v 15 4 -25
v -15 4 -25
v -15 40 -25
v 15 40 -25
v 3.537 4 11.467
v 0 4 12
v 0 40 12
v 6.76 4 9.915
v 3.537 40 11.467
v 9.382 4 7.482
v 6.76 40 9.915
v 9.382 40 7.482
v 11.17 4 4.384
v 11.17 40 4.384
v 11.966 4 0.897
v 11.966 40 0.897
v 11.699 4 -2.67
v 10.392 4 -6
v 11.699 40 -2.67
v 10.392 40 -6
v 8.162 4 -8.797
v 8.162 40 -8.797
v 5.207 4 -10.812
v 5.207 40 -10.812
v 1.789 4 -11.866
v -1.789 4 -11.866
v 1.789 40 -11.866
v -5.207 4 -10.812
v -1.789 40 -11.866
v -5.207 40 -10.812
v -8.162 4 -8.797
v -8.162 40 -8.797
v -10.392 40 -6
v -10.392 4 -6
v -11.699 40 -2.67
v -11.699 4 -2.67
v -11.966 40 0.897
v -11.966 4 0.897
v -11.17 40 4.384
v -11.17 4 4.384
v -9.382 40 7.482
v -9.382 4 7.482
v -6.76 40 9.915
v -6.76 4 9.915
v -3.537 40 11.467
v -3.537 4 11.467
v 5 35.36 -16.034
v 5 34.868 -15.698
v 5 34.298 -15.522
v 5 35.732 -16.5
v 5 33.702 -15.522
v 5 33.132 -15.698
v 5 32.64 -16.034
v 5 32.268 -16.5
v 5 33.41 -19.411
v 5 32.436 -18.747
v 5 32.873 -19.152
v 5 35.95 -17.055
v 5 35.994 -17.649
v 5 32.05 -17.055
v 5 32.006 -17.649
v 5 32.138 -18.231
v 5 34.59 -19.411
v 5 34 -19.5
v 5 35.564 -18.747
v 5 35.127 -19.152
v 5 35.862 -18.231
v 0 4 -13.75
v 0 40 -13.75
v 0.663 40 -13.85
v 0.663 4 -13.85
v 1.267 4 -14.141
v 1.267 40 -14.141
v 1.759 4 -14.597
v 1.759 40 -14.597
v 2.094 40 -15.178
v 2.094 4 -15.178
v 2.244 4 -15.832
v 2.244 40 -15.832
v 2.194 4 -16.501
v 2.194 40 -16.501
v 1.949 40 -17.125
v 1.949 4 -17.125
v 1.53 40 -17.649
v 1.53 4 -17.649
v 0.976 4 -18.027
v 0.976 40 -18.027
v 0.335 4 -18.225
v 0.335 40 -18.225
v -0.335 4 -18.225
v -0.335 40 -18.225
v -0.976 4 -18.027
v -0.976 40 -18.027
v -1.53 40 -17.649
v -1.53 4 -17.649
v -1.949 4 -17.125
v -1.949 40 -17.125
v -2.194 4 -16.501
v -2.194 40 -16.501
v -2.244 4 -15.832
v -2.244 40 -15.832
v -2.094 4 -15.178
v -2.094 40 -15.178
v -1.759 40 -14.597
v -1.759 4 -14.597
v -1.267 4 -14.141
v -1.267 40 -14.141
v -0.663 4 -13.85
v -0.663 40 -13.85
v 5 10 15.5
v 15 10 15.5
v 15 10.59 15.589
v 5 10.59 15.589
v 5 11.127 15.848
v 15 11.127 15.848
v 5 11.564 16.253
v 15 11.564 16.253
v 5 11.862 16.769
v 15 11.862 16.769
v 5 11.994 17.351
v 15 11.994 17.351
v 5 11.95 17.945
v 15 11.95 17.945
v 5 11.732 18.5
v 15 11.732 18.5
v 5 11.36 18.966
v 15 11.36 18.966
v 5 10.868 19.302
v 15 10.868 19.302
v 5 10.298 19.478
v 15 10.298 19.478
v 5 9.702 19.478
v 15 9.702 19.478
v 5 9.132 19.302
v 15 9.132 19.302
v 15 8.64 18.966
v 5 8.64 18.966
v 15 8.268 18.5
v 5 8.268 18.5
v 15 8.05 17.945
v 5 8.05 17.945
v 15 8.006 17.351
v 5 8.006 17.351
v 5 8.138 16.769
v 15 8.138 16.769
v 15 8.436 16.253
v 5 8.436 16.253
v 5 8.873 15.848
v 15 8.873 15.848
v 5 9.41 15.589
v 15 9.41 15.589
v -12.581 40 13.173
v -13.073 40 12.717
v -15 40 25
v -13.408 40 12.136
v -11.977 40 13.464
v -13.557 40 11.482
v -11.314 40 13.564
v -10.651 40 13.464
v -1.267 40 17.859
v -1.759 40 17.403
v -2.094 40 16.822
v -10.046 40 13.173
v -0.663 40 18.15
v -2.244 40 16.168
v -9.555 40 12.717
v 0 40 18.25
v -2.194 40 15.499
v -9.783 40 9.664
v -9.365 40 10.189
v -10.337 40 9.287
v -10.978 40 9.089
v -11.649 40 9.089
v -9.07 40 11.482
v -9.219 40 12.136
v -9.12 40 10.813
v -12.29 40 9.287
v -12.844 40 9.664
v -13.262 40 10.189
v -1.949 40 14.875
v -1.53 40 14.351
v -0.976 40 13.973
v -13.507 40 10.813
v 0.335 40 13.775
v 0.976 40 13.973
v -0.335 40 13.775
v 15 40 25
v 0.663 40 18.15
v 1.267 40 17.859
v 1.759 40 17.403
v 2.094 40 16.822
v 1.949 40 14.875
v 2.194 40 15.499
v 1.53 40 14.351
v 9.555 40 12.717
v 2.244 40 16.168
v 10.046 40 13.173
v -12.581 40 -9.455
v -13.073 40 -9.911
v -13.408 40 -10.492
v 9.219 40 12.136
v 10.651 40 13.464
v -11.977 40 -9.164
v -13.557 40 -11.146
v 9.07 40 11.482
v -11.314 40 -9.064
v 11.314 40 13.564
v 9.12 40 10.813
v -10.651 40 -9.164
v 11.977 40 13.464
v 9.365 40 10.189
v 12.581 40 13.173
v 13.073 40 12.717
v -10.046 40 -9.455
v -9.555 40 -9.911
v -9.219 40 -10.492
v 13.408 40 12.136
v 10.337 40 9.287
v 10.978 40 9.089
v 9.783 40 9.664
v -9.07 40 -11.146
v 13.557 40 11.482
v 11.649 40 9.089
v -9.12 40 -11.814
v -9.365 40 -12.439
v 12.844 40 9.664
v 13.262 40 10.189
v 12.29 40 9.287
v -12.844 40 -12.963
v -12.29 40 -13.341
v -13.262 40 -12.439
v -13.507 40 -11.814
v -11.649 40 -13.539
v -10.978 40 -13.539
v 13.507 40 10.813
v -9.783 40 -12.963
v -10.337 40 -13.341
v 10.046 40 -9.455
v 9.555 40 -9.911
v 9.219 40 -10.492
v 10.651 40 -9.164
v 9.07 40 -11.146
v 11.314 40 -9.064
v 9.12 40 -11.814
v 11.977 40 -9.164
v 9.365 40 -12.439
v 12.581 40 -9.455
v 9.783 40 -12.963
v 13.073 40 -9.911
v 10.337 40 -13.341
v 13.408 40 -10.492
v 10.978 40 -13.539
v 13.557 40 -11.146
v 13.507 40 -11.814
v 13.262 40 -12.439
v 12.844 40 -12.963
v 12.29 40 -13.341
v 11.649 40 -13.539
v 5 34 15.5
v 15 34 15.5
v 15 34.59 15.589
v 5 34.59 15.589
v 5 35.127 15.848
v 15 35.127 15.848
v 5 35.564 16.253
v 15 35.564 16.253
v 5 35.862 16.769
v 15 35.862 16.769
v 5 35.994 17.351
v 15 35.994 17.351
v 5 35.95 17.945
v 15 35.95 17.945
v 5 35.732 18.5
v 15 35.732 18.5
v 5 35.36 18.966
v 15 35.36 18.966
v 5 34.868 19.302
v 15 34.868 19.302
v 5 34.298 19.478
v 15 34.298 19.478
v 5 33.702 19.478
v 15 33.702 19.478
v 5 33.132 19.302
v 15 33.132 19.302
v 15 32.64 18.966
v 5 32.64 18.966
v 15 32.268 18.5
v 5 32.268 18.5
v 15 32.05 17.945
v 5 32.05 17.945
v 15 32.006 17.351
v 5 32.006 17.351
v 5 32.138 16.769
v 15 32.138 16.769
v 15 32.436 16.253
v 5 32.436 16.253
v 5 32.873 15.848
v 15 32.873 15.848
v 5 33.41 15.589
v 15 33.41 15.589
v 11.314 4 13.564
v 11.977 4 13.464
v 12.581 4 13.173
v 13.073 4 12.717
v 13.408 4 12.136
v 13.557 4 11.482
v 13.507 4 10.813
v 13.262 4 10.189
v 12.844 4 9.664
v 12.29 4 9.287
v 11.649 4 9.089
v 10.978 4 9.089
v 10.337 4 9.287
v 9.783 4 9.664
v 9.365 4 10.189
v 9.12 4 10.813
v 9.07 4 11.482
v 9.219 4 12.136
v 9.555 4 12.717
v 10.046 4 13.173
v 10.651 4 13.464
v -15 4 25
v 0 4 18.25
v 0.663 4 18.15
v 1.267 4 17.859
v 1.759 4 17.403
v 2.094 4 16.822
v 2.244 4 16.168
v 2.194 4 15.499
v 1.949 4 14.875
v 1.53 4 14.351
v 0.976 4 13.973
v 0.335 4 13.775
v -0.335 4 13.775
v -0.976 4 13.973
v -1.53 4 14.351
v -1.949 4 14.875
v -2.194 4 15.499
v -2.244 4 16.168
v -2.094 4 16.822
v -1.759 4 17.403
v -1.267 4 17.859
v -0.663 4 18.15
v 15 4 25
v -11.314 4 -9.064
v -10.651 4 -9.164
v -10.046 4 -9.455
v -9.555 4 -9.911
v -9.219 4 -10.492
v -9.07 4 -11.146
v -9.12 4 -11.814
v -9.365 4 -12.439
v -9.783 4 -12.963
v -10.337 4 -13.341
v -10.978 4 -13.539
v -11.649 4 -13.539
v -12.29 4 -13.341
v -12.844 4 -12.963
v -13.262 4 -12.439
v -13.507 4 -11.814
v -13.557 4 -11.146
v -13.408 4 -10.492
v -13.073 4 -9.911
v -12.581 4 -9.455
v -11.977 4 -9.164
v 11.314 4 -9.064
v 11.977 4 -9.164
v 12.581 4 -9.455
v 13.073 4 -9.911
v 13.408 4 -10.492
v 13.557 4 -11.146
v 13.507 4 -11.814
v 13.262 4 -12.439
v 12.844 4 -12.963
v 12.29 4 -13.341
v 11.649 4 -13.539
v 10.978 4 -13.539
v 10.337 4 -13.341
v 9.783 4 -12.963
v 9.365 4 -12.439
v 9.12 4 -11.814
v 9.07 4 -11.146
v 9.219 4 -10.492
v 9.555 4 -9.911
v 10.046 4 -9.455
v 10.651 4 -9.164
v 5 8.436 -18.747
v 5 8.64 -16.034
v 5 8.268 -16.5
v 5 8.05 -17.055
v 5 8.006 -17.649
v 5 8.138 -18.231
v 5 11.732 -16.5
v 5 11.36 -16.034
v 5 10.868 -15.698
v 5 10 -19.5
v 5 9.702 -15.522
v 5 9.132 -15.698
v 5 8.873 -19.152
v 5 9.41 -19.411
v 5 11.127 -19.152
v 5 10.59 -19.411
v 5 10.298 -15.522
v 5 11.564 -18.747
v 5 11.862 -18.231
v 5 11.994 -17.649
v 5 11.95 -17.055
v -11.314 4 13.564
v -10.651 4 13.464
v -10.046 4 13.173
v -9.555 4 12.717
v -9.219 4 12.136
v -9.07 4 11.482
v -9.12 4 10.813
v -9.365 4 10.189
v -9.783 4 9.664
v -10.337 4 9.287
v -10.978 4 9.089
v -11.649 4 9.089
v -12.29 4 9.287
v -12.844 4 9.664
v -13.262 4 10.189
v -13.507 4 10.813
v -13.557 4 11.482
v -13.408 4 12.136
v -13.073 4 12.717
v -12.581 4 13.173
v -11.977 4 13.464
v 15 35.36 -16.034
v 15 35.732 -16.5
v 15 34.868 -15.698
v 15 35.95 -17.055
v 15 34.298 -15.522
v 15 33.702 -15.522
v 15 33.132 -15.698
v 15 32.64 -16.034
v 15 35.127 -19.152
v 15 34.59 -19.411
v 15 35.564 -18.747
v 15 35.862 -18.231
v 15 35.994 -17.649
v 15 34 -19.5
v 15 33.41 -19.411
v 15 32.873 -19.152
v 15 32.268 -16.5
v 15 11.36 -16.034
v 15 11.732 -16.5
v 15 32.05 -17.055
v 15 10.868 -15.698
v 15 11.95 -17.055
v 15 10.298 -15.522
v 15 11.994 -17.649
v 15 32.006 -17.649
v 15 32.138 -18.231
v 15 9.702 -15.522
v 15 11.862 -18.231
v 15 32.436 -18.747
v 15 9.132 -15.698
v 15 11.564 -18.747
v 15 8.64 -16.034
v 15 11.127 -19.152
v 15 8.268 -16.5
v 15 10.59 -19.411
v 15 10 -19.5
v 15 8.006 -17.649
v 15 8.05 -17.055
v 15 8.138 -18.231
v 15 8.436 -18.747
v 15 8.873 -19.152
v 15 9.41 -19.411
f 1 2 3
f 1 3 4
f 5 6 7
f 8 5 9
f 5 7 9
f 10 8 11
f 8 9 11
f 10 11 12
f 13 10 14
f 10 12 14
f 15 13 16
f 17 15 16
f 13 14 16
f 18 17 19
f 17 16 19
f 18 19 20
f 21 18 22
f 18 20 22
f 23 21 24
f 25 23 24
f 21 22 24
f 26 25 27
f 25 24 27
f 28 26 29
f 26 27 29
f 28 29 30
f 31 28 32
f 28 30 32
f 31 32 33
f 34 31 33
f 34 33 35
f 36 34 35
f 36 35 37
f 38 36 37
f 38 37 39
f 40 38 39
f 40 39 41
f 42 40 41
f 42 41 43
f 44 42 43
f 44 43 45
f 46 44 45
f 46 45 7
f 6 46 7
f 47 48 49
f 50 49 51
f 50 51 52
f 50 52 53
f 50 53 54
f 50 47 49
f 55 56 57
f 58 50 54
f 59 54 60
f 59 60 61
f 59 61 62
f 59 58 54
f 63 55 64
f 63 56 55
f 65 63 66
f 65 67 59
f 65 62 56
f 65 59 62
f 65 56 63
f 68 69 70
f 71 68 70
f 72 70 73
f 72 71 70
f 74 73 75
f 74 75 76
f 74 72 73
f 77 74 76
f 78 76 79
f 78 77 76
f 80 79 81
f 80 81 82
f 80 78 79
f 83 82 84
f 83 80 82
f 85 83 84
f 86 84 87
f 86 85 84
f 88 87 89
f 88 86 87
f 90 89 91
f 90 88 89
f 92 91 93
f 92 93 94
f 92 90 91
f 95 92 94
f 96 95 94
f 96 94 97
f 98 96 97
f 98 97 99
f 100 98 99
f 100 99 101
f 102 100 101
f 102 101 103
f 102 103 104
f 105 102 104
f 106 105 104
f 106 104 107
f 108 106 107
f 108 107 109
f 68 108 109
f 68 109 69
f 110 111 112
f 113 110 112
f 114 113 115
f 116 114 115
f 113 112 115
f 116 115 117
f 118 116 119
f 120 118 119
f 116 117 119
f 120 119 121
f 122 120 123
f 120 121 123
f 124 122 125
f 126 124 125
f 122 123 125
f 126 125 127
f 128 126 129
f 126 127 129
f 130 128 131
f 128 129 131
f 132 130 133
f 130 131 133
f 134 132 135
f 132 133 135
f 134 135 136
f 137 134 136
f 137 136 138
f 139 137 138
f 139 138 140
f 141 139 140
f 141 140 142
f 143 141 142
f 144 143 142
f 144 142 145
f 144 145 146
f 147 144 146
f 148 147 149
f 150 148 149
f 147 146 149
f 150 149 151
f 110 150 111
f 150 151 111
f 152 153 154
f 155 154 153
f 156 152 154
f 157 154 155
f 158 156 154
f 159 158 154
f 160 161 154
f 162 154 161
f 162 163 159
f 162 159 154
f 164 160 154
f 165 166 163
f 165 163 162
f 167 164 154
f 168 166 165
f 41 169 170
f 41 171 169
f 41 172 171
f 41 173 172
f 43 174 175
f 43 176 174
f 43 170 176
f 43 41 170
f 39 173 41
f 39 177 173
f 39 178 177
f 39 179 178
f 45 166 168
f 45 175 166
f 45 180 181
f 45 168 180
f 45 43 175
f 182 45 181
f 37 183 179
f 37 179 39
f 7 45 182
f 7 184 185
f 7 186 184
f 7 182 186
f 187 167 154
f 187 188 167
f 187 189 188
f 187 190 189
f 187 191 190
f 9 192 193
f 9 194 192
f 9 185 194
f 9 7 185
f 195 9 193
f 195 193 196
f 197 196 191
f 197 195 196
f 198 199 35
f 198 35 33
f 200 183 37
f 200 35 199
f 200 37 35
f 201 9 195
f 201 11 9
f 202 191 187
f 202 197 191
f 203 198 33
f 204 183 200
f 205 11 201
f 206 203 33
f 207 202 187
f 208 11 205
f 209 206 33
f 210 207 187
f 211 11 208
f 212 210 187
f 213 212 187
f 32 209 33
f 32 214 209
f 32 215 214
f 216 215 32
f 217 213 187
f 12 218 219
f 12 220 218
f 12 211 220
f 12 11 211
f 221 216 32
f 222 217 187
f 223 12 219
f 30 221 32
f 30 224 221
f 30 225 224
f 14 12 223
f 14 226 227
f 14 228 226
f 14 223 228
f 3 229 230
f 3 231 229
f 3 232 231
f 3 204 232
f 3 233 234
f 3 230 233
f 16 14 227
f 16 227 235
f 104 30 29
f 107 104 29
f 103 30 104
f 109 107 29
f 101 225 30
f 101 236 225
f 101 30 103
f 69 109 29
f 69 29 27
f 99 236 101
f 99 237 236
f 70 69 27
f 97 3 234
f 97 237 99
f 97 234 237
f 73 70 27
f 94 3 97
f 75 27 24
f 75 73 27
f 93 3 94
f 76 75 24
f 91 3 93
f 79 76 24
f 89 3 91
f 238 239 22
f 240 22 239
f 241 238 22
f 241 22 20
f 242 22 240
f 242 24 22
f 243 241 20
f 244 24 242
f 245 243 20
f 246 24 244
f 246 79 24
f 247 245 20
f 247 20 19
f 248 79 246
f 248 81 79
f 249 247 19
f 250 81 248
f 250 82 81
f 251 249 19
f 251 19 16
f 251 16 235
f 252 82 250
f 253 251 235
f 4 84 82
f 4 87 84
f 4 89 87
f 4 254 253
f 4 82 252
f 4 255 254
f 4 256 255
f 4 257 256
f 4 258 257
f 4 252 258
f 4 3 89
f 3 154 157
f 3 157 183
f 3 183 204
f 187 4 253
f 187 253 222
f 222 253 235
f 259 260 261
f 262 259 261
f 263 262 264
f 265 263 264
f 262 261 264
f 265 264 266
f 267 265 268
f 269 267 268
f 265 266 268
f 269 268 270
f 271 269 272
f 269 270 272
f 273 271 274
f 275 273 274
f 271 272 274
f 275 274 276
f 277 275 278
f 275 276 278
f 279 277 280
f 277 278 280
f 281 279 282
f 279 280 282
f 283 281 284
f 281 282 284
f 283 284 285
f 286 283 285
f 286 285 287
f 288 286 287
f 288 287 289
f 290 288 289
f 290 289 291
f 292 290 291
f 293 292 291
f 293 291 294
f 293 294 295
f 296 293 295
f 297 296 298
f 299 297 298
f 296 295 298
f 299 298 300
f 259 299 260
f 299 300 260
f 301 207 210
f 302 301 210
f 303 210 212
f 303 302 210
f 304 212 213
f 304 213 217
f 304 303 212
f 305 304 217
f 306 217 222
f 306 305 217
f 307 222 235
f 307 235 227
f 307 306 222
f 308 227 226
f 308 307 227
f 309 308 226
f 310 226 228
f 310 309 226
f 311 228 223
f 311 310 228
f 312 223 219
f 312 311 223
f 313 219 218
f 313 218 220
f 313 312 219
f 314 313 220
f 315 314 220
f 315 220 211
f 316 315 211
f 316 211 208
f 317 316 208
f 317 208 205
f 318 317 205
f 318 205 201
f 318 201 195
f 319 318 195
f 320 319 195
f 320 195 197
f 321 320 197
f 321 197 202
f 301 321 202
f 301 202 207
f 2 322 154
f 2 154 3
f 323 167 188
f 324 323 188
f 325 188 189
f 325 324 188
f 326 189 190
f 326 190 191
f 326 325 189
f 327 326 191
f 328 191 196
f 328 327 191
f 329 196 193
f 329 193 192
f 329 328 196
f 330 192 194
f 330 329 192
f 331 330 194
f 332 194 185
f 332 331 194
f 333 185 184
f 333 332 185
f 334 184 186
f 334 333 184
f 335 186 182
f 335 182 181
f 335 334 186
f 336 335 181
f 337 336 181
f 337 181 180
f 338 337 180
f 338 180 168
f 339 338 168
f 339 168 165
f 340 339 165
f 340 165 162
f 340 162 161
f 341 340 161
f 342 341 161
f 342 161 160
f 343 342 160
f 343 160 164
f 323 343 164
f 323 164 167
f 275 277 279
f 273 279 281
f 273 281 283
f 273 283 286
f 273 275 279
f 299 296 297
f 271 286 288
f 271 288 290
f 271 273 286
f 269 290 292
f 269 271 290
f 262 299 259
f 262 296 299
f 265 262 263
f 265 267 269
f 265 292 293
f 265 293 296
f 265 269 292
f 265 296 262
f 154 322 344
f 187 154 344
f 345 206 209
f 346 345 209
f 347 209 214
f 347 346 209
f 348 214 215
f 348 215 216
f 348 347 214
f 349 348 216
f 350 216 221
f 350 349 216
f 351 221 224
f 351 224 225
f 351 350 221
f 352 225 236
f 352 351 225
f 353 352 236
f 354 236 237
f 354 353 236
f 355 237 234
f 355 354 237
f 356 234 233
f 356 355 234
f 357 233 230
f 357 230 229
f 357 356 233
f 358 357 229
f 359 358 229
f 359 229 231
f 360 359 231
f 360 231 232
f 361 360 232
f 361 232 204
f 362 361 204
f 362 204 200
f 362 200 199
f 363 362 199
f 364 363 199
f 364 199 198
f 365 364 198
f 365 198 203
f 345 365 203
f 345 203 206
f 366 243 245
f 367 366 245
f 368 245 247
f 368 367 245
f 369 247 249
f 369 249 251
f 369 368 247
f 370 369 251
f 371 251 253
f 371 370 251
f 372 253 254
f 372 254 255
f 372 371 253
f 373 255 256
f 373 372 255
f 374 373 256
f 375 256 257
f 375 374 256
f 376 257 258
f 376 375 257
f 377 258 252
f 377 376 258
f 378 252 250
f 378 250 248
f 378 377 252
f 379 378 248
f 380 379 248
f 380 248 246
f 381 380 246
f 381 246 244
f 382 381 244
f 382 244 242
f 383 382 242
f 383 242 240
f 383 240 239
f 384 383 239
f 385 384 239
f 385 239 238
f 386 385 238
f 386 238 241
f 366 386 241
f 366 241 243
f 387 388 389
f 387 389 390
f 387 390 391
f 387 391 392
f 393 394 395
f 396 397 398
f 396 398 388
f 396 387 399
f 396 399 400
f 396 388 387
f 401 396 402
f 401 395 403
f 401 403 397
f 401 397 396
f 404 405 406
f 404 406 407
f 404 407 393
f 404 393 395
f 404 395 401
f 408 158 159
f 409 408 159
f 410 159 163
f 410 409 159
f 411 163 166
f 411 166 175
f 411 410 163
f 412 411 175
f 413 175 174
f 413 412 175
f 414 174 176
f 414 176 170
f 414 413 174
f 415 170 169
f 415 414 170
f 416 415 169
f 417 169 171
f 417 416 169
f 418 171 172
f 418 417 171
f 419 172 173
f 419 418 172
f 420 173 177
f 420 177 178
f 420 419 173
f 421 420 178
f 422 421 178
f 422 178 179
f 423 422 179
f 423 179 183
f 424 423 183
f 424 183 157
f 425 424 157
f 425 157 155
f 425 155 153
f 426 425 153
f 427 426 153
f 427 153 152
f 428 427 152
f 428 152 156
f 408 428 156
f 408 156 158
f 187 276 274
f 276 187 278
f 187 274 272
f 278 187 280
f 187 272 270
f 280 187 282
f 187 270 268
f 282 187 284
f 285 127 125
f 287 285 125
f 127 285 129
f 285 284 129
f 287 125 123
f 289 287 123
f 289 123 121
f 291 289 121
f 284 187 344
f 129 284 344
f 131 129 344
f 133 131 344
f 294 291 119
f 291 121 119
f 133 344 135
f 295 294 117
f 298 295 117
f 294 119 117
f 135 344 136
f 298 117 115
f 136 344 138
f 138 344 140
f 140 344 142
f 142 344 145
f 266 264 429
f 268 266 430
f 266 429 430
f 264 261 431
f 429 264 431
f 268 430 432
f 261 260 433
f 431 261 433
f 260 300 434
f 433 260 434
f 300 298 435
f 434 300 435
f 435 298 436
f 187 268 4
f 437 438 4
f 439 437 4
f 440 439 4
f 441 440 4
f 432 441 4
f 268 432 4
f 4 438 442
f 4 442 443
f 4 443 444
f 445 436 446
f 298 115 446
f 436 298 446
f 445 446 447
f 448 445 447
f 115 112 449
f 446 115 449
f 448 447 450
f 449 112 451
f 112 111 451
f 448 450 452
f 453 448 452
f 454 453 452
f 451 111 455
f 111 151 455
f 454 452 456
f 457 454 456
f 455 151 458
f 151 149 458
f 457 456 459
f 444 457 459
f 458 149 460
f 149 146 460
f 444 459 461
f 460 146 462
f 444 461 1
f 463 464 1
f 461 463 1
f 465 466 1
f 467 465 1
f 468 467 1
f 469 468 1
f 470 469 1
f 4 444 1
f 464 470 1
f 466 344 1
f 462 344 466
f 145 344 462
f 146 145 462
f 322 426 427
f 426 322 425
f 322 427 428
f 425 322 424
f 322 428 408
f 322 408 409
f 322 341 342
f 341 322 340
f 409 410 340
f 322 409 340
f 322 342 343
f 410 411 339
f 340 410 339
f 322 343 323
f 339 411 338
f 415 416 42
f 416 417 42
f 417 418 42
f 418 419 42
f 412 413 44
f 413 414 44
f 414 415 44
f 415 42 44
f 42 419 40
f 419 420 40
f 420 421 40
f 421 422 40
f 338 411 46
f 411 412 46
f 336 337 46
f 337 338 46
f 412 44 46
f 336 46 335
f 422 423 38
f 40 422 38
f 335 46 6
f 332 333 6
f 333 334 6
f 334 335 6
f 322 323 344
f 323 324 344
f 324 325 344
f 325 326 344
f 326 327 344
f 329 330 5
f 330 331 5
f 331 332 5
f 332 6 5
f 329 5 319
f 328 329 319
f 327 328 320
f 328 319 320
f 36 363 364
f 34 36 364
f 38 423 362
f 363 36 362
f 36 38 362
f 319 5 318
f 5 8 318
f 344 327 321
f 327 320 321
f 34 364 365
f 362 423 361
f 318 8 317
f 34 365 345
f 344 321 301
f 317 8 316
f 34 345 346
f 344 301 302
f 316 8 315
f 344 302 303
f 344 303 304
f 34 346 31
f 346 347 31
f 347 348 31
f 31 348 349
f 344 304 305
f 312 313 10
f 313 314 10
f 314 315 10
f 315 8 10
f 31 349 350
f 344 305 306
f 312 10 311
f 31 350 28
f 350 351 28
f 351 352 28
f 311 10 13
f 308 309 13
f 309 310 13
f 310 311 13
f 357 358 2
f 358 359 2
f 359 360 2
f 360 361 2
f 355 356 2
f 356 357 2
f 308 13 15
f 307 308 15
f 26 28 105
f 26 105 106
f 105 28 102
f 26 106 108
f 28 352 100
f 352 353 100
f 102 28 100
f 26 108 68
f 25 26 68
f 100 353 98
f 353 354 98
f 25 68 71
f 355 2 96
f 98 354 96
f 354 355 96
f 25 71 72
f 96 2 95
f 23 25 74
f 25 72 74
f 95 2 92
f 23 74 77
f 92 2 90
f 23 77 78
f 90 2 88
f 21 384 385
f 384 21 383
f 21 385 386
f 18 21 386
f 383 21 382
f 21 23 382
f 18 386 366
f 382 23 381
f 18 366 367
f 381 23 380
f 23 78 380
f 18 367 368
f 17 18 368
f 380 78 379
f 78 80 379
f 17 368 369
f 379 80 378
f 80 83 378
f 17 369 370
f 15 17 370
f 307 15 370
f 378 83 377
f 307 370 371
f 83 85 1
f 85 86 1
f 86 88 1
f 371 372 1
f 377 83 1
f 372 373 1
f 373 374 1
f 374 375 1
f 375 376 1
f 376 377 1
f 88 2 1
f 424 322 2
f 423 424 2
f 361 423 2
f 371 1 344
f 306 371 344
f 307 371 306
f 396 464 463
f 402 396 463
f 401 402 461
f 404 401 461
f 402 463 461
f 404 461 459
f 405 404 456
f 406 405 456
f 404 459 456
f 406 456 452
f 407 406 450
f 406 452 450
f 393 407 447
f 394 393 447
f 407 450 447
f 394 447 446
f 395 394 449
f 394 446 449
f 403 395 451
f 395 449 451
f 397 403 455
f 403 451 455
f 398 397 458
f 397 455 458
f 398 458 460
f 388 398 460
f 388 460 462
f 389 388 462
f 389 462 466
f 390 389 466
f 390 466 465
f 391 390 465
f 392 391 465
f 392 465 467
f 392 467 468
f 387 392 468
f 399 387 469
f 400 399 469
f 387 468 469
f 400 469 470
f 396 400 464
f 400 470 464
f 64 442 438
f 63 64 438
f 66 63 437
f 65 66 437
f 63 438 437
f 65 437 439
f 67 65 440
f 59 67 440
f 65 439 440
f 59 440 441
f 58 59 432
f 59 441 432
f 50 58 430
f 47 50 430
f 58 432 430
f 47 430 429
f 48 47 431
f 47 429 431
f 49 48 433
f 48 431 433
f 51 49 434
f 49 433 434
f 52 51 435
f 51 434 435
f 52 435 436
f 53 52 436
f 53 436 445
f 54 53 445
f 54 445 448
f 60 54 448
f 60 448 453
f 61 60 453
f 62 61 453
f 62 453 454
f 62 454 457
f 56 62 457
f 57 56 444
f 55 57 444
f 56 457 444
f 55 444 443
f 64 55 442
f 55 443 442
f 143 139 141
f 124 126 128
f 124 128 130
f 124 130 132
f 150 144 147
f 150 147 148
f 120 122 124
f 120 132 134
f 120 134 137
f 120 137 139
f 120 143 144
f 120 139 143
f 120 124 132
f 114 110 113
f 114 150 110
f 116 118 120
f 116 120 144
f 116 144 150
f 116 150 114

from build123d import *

# Parameters (mm, degrees)
SKETCH_1_R           = 12
SKETCH_1_R_2         = 6
EXTRUDE_1_DEPTH      = 30
SKETCH_2_R           = 6
SKETCH_2_R_2         = 2.25
EXTRUDE_2_DEPTH      = 10
EXTRUDE_START        = -36
SKETCH_23_W          = 30
SKETCH_23_H          = 50
SKETCH_23_R          = 2.25
EXTRUDE_10_DEPTH     = 36
SKETCH_24_W          = 30
SKETCH_24_H          = 8
CUT_EXTRUDE_16_DEPTH = 66.76473219
SKETCH_25_R          = 12
CUT_EXTRUDE_17_DEPTH = 47.324939288
SKETCH_26_R          = 2
CUT_EXTRUDE_18_DEPTH = 10


with BuildPart() as part:
    # 草图1 → 凸台-拉伸1 (new body)
    with BuildSketch(Plane(origin=(0, 0, 0), x_dir=(1, 0, 0), z_dir=(0, 1, 0))):
        Circle(SKETCH_1_R)
        Circle(SKETCH_1_R_2, mode=Mode.SUBTRACT)
    extrude(amount=EXTRUDE_1_DEPTH)

    # 草图2 → 凸台-拉伸2 (add)
    with BuildSketch(Plane(origin=(0, 30, 0), x_dir=(1, 0, 0), z_dir=(0, 1, 0))):
        with BuildLine():
            Line((-15, 13.228756555), (-15, -13.228756555))
            ThreePointArc((-15, -13.228756555), (0, -20), (15, -13.228756555))
            Line((15, -13.228756555), (15, 13.228756555))
            ThreePointArc((15, 13.228756555), (0, 20), (-15, 13.228756555))
        make_face()
        Circle(SKETCH_2_R, mode=Mode.SUBTRACT)
        with Locations((0, 16)):
            Circle(SKETCH_2_R_2, mode=Mode.SUBTRACT)
        with Locations((11.313708499, 11.313708499)):
            Circle(SKETCH_2_R_2, mode=Mode.SUBTRACT)
        with Locations((11.313708499, -11.313708499)):
            Circle(SKETCH_2_R_2, mode=Mode.SUBTRACT)
        with Locations((0, -16)):
            Circle(SKETCH_2_R_2, mode=Mode.SUBTRACT)
        with Locations((-11.313708499, -11.313708499)):
            Circle(SKETCH_2_R_2, mode=Mode.SUBTRACT)
        with Locations((-11.313708499, 11.313708499)):
            Circle(SKETCH_2_R_2, mode=Mode.SUBTRACT)
    extrude(amount=EXTRUDE_2_DEPTH)

    # 草图23 → 凸台-拉伸10 (add)
    with BuildSketch(Plane(origin=(0, 40, 0), x_dir=(1, 0, 0), z_dir=(0, 1, 0)).offset(EXTRUDE_START)):
        Rectangle(SKETCH_23_W, SKETCH_23_H)
        with Locations((-11.313708499, -11.313708499)):
            Circle(SKETCH_23_R, mode=Mode.SUBTRACT)
        with Locations((0, -16)):
            Circle(SKETCH_23_R, mode=Mode.SUBTRACT)
        with Locations((11.313708499, -11.313708499)):
            Circle(SKETCH_23_R, mode=Mode.SUBTRACT)
        with Locations((11.313708499, 11.313708499)):
            Circle(SKETCH_23_R, mode=Mode.SUBTRACT)
        with Locations((0, 16)):
            Circle(SKETCH_23_R, mode=Mode.SUBTRACT)
        with Locations((-11.313708499, 11.313708499)):
            Circle(SKETCH_23_R, mode=Mode.SUBTRACT)
    extrude(amount=EXTRUDE_10_DEPTH)

    # 草图24 → 切除-拉伸16 (cut, through all)
    with BuildSketch(Plane.XY.offset(25)):
        Rectangle(SKETCH_24_W, SKETCH_24_H)
    extrude(amount=-CUT_EXTRUDE_16_DEPTH, mode=Mode.SUBTRACT)

    # 草图25 → 切除-拉伸17 (cut, through all)
    with BuildSketch(Plane(origin=(0, 40, 0), x_dir=(1, 0, 0), z_dir=(0, 1, 0))):
        Circle(SKETCH_25_R)
    extrude(amount=-CUT_EXTRUDE_17_DEPTH, mode=Mode.SUBTRACT)

    # 草图26 → 切除-拉伸18 (cut)
    with BuildSketch(Plane(origin=(15, 0, 0), x_dir=(0, 0, -1), z_dir=(1, 0, 0))):
        with Locations((17.5, 34)):
            Circle(SKETCH_26_R)
        with Locations((-17.5, 34)):
            Circle(SKETCH_26_R)
        with Locations((-17.5, 10)):
            Circle(SKETCH_26_R)
        with Locations((17.5, 10)):
            Circle(SKETCH_26_R)
    extrude(amount=-CUT_EXTRUDE_18_DEPTH, mode=Mode.SUBTRACT)


solid = part.part
